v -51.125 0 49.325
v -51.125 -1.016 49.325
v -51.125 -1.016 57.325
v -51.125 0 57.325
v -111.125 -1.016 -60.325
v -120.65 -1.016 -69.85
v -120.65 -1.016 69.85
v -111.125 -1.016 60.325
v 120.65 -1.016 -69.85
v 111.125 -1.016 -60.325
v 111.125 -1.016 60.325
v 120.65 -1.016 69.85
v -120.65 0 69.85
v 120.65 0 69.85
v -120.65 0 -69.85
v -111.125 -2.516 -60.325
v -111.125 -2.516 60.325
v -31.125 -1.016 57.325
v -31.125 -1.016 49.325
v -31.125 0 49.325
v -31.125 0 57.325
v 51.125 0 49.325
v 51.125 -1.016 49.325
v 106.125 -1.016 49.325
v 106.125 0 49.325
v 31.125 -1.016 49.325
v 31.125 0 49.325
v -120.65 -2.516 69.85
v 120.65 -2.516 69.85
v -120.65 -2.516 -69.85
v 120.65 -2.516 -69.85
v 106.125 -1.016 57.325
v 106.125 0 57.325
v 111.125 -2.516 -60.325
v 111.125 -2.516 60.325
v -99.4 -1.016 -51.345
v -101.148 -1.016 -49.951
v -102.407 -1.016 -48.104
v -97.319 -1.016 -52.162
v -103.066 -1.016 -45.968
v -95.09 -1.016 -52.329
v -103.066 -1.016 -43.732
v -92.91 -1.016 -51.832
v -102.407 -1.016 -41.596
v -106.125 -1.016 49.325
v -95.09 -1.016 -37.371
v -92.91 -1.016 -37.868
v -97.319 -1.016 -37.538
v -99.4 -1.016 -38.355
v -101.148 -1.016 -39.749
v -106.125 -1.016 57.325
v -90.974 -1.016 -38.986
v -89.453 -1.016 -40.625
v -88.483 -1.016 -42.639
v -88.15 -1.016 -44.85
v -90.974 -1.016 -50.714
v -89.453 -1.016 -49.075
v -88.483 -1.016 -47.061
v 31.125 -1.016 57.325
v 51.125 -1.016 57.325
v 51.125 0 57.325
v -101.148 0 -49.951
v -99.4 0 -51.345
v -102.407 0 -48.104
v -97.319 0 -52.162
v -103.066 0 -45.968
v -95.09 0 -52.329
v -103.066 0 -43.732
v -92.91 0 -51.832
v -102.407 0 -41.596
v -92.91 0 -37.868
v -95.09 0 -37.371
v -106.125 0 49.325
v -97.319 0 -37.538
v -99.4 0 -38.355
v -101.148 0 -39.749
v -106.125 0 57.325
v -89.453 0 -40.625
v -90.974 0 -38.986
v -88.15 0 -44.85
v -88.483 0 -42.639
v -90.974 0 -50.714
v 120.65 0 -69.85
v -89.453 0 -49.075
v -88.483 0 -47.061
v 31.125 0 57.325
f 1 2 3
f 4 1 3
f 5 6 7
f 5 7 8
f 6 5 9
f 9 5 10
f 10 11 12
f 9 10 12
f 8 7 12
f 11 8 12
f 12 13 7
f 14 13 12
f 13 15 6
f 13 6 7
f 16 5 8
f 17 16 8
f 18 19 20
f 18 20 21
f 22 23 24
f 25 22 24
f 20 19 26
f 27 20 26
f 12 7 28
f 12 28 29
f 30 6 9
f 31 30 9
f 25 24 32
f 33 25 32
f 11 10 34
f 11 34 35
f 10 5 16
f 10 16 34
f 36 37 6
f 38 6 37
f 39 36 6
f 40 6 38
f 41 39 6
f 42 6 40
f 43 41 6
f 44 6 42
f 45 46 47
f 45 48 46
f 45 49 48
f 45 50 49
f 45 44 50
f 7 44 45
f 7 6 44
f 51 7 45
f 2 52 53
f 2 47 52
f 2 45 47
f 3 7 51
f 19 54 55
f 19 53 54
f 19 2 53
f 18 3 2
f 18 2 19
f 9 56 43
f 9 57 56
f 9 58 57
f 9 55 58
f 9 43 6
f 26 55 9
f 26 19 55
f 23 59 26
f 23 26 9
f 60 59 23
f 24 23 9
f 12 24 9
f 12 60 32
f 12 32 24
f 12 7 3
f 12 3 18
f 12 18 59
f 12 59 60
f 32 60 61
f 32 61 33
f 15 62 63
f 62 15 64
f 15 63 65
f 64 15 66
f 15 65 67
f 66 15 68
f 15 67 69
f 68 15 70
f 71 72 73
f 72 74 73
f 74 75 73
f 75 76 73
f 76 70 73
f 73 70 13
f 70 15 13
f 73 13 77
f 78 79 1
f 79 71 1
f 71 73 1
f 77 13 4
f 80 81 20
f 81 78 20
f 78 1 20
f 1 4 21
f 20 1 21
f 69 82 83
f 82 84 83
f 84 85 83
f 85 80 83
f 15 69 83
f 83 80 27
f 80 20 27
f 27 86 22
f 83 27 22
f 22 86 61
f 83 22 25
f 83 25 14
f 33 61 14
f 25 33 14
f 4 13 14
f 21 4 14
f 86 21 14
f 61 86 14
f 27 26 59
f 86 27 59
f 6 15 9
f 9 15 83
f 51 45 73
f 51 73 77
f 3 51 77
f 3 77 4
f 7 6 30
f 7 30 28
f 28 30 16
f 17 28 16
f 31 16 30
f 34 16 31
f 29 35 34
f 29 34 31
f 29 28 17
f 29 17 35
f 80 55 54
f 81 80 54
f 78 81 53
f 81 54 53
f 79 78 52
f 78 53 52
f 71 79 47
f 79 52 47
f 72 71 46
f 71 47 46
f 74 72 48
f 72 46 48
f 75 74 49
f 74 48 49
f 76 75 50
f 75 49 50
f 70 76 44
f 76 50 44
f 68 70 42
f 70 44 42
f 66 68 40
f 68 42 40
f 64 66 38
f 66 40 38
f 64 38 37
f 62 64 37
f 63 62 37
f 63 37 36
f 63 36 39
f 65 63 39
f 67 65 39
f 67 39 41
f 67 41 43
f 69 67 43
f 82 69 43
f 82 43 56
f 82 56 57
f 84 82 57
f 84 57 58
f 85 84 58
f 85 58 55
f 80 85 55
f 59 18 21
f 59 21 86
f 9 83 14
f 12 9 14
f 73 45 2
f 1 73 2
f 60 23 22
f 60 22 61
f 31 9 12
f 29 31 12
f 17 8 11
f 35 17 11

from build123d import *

# Parameters (mm, degrees)
F0_W     = 241.3
F0_H     = 139.7
F1_DEPTH = 1.016
F3_R     = 7.5
F3_W     = 55
F3_H     = 8
F3_W_2   = 62.25
F4_DEPTH = 1.017
F2_W     = 241.3
F2_H     = 139.7
F2_W_2   = 222.25
F2_H_2   = 120.65
F5_DEPTH = 1.5


with BuildPart() as f1:
    # F0 (on Front) → F1 (new body)
    with BuildSketch(Plane.XZ):
        Rectangle(F0_W, F0_H)
    extrude(amount=F1_DEPTH)

    # F3 (on face) → F4 (cut, through all)
    with BuildSketch(Plane.XZ.offset(1.016)):
        with Locations((-95.65, -44.85)):
            Circle(F3_R)
        with Locations((-78.625, 53.325)):
            Rectangle(F3_W, F3_H)
        with Locations((0, 53.325)):
            Rectangle(F3_W_2, F3_H)
        with Locations((78.625, 53.325)):
            Rectangle(F3_W, F3_H)
    extrude(amount=-F4_DEPTH, mode=Mode.SUBTRACT)


with BuildPart() as f5:
    # F2 (on face) → F5 (new body)
    with BuildSketch(Plane.XZ.offset(1.016)):
        Rectangle(F2_W, F2_H)
        Rectangle(F2_W_2, F2_H_2, mode=Mode.SUBTRACT)
    extrude(amount=F5_DEPTH)


solid = Compound([f1.part, f5.part])
